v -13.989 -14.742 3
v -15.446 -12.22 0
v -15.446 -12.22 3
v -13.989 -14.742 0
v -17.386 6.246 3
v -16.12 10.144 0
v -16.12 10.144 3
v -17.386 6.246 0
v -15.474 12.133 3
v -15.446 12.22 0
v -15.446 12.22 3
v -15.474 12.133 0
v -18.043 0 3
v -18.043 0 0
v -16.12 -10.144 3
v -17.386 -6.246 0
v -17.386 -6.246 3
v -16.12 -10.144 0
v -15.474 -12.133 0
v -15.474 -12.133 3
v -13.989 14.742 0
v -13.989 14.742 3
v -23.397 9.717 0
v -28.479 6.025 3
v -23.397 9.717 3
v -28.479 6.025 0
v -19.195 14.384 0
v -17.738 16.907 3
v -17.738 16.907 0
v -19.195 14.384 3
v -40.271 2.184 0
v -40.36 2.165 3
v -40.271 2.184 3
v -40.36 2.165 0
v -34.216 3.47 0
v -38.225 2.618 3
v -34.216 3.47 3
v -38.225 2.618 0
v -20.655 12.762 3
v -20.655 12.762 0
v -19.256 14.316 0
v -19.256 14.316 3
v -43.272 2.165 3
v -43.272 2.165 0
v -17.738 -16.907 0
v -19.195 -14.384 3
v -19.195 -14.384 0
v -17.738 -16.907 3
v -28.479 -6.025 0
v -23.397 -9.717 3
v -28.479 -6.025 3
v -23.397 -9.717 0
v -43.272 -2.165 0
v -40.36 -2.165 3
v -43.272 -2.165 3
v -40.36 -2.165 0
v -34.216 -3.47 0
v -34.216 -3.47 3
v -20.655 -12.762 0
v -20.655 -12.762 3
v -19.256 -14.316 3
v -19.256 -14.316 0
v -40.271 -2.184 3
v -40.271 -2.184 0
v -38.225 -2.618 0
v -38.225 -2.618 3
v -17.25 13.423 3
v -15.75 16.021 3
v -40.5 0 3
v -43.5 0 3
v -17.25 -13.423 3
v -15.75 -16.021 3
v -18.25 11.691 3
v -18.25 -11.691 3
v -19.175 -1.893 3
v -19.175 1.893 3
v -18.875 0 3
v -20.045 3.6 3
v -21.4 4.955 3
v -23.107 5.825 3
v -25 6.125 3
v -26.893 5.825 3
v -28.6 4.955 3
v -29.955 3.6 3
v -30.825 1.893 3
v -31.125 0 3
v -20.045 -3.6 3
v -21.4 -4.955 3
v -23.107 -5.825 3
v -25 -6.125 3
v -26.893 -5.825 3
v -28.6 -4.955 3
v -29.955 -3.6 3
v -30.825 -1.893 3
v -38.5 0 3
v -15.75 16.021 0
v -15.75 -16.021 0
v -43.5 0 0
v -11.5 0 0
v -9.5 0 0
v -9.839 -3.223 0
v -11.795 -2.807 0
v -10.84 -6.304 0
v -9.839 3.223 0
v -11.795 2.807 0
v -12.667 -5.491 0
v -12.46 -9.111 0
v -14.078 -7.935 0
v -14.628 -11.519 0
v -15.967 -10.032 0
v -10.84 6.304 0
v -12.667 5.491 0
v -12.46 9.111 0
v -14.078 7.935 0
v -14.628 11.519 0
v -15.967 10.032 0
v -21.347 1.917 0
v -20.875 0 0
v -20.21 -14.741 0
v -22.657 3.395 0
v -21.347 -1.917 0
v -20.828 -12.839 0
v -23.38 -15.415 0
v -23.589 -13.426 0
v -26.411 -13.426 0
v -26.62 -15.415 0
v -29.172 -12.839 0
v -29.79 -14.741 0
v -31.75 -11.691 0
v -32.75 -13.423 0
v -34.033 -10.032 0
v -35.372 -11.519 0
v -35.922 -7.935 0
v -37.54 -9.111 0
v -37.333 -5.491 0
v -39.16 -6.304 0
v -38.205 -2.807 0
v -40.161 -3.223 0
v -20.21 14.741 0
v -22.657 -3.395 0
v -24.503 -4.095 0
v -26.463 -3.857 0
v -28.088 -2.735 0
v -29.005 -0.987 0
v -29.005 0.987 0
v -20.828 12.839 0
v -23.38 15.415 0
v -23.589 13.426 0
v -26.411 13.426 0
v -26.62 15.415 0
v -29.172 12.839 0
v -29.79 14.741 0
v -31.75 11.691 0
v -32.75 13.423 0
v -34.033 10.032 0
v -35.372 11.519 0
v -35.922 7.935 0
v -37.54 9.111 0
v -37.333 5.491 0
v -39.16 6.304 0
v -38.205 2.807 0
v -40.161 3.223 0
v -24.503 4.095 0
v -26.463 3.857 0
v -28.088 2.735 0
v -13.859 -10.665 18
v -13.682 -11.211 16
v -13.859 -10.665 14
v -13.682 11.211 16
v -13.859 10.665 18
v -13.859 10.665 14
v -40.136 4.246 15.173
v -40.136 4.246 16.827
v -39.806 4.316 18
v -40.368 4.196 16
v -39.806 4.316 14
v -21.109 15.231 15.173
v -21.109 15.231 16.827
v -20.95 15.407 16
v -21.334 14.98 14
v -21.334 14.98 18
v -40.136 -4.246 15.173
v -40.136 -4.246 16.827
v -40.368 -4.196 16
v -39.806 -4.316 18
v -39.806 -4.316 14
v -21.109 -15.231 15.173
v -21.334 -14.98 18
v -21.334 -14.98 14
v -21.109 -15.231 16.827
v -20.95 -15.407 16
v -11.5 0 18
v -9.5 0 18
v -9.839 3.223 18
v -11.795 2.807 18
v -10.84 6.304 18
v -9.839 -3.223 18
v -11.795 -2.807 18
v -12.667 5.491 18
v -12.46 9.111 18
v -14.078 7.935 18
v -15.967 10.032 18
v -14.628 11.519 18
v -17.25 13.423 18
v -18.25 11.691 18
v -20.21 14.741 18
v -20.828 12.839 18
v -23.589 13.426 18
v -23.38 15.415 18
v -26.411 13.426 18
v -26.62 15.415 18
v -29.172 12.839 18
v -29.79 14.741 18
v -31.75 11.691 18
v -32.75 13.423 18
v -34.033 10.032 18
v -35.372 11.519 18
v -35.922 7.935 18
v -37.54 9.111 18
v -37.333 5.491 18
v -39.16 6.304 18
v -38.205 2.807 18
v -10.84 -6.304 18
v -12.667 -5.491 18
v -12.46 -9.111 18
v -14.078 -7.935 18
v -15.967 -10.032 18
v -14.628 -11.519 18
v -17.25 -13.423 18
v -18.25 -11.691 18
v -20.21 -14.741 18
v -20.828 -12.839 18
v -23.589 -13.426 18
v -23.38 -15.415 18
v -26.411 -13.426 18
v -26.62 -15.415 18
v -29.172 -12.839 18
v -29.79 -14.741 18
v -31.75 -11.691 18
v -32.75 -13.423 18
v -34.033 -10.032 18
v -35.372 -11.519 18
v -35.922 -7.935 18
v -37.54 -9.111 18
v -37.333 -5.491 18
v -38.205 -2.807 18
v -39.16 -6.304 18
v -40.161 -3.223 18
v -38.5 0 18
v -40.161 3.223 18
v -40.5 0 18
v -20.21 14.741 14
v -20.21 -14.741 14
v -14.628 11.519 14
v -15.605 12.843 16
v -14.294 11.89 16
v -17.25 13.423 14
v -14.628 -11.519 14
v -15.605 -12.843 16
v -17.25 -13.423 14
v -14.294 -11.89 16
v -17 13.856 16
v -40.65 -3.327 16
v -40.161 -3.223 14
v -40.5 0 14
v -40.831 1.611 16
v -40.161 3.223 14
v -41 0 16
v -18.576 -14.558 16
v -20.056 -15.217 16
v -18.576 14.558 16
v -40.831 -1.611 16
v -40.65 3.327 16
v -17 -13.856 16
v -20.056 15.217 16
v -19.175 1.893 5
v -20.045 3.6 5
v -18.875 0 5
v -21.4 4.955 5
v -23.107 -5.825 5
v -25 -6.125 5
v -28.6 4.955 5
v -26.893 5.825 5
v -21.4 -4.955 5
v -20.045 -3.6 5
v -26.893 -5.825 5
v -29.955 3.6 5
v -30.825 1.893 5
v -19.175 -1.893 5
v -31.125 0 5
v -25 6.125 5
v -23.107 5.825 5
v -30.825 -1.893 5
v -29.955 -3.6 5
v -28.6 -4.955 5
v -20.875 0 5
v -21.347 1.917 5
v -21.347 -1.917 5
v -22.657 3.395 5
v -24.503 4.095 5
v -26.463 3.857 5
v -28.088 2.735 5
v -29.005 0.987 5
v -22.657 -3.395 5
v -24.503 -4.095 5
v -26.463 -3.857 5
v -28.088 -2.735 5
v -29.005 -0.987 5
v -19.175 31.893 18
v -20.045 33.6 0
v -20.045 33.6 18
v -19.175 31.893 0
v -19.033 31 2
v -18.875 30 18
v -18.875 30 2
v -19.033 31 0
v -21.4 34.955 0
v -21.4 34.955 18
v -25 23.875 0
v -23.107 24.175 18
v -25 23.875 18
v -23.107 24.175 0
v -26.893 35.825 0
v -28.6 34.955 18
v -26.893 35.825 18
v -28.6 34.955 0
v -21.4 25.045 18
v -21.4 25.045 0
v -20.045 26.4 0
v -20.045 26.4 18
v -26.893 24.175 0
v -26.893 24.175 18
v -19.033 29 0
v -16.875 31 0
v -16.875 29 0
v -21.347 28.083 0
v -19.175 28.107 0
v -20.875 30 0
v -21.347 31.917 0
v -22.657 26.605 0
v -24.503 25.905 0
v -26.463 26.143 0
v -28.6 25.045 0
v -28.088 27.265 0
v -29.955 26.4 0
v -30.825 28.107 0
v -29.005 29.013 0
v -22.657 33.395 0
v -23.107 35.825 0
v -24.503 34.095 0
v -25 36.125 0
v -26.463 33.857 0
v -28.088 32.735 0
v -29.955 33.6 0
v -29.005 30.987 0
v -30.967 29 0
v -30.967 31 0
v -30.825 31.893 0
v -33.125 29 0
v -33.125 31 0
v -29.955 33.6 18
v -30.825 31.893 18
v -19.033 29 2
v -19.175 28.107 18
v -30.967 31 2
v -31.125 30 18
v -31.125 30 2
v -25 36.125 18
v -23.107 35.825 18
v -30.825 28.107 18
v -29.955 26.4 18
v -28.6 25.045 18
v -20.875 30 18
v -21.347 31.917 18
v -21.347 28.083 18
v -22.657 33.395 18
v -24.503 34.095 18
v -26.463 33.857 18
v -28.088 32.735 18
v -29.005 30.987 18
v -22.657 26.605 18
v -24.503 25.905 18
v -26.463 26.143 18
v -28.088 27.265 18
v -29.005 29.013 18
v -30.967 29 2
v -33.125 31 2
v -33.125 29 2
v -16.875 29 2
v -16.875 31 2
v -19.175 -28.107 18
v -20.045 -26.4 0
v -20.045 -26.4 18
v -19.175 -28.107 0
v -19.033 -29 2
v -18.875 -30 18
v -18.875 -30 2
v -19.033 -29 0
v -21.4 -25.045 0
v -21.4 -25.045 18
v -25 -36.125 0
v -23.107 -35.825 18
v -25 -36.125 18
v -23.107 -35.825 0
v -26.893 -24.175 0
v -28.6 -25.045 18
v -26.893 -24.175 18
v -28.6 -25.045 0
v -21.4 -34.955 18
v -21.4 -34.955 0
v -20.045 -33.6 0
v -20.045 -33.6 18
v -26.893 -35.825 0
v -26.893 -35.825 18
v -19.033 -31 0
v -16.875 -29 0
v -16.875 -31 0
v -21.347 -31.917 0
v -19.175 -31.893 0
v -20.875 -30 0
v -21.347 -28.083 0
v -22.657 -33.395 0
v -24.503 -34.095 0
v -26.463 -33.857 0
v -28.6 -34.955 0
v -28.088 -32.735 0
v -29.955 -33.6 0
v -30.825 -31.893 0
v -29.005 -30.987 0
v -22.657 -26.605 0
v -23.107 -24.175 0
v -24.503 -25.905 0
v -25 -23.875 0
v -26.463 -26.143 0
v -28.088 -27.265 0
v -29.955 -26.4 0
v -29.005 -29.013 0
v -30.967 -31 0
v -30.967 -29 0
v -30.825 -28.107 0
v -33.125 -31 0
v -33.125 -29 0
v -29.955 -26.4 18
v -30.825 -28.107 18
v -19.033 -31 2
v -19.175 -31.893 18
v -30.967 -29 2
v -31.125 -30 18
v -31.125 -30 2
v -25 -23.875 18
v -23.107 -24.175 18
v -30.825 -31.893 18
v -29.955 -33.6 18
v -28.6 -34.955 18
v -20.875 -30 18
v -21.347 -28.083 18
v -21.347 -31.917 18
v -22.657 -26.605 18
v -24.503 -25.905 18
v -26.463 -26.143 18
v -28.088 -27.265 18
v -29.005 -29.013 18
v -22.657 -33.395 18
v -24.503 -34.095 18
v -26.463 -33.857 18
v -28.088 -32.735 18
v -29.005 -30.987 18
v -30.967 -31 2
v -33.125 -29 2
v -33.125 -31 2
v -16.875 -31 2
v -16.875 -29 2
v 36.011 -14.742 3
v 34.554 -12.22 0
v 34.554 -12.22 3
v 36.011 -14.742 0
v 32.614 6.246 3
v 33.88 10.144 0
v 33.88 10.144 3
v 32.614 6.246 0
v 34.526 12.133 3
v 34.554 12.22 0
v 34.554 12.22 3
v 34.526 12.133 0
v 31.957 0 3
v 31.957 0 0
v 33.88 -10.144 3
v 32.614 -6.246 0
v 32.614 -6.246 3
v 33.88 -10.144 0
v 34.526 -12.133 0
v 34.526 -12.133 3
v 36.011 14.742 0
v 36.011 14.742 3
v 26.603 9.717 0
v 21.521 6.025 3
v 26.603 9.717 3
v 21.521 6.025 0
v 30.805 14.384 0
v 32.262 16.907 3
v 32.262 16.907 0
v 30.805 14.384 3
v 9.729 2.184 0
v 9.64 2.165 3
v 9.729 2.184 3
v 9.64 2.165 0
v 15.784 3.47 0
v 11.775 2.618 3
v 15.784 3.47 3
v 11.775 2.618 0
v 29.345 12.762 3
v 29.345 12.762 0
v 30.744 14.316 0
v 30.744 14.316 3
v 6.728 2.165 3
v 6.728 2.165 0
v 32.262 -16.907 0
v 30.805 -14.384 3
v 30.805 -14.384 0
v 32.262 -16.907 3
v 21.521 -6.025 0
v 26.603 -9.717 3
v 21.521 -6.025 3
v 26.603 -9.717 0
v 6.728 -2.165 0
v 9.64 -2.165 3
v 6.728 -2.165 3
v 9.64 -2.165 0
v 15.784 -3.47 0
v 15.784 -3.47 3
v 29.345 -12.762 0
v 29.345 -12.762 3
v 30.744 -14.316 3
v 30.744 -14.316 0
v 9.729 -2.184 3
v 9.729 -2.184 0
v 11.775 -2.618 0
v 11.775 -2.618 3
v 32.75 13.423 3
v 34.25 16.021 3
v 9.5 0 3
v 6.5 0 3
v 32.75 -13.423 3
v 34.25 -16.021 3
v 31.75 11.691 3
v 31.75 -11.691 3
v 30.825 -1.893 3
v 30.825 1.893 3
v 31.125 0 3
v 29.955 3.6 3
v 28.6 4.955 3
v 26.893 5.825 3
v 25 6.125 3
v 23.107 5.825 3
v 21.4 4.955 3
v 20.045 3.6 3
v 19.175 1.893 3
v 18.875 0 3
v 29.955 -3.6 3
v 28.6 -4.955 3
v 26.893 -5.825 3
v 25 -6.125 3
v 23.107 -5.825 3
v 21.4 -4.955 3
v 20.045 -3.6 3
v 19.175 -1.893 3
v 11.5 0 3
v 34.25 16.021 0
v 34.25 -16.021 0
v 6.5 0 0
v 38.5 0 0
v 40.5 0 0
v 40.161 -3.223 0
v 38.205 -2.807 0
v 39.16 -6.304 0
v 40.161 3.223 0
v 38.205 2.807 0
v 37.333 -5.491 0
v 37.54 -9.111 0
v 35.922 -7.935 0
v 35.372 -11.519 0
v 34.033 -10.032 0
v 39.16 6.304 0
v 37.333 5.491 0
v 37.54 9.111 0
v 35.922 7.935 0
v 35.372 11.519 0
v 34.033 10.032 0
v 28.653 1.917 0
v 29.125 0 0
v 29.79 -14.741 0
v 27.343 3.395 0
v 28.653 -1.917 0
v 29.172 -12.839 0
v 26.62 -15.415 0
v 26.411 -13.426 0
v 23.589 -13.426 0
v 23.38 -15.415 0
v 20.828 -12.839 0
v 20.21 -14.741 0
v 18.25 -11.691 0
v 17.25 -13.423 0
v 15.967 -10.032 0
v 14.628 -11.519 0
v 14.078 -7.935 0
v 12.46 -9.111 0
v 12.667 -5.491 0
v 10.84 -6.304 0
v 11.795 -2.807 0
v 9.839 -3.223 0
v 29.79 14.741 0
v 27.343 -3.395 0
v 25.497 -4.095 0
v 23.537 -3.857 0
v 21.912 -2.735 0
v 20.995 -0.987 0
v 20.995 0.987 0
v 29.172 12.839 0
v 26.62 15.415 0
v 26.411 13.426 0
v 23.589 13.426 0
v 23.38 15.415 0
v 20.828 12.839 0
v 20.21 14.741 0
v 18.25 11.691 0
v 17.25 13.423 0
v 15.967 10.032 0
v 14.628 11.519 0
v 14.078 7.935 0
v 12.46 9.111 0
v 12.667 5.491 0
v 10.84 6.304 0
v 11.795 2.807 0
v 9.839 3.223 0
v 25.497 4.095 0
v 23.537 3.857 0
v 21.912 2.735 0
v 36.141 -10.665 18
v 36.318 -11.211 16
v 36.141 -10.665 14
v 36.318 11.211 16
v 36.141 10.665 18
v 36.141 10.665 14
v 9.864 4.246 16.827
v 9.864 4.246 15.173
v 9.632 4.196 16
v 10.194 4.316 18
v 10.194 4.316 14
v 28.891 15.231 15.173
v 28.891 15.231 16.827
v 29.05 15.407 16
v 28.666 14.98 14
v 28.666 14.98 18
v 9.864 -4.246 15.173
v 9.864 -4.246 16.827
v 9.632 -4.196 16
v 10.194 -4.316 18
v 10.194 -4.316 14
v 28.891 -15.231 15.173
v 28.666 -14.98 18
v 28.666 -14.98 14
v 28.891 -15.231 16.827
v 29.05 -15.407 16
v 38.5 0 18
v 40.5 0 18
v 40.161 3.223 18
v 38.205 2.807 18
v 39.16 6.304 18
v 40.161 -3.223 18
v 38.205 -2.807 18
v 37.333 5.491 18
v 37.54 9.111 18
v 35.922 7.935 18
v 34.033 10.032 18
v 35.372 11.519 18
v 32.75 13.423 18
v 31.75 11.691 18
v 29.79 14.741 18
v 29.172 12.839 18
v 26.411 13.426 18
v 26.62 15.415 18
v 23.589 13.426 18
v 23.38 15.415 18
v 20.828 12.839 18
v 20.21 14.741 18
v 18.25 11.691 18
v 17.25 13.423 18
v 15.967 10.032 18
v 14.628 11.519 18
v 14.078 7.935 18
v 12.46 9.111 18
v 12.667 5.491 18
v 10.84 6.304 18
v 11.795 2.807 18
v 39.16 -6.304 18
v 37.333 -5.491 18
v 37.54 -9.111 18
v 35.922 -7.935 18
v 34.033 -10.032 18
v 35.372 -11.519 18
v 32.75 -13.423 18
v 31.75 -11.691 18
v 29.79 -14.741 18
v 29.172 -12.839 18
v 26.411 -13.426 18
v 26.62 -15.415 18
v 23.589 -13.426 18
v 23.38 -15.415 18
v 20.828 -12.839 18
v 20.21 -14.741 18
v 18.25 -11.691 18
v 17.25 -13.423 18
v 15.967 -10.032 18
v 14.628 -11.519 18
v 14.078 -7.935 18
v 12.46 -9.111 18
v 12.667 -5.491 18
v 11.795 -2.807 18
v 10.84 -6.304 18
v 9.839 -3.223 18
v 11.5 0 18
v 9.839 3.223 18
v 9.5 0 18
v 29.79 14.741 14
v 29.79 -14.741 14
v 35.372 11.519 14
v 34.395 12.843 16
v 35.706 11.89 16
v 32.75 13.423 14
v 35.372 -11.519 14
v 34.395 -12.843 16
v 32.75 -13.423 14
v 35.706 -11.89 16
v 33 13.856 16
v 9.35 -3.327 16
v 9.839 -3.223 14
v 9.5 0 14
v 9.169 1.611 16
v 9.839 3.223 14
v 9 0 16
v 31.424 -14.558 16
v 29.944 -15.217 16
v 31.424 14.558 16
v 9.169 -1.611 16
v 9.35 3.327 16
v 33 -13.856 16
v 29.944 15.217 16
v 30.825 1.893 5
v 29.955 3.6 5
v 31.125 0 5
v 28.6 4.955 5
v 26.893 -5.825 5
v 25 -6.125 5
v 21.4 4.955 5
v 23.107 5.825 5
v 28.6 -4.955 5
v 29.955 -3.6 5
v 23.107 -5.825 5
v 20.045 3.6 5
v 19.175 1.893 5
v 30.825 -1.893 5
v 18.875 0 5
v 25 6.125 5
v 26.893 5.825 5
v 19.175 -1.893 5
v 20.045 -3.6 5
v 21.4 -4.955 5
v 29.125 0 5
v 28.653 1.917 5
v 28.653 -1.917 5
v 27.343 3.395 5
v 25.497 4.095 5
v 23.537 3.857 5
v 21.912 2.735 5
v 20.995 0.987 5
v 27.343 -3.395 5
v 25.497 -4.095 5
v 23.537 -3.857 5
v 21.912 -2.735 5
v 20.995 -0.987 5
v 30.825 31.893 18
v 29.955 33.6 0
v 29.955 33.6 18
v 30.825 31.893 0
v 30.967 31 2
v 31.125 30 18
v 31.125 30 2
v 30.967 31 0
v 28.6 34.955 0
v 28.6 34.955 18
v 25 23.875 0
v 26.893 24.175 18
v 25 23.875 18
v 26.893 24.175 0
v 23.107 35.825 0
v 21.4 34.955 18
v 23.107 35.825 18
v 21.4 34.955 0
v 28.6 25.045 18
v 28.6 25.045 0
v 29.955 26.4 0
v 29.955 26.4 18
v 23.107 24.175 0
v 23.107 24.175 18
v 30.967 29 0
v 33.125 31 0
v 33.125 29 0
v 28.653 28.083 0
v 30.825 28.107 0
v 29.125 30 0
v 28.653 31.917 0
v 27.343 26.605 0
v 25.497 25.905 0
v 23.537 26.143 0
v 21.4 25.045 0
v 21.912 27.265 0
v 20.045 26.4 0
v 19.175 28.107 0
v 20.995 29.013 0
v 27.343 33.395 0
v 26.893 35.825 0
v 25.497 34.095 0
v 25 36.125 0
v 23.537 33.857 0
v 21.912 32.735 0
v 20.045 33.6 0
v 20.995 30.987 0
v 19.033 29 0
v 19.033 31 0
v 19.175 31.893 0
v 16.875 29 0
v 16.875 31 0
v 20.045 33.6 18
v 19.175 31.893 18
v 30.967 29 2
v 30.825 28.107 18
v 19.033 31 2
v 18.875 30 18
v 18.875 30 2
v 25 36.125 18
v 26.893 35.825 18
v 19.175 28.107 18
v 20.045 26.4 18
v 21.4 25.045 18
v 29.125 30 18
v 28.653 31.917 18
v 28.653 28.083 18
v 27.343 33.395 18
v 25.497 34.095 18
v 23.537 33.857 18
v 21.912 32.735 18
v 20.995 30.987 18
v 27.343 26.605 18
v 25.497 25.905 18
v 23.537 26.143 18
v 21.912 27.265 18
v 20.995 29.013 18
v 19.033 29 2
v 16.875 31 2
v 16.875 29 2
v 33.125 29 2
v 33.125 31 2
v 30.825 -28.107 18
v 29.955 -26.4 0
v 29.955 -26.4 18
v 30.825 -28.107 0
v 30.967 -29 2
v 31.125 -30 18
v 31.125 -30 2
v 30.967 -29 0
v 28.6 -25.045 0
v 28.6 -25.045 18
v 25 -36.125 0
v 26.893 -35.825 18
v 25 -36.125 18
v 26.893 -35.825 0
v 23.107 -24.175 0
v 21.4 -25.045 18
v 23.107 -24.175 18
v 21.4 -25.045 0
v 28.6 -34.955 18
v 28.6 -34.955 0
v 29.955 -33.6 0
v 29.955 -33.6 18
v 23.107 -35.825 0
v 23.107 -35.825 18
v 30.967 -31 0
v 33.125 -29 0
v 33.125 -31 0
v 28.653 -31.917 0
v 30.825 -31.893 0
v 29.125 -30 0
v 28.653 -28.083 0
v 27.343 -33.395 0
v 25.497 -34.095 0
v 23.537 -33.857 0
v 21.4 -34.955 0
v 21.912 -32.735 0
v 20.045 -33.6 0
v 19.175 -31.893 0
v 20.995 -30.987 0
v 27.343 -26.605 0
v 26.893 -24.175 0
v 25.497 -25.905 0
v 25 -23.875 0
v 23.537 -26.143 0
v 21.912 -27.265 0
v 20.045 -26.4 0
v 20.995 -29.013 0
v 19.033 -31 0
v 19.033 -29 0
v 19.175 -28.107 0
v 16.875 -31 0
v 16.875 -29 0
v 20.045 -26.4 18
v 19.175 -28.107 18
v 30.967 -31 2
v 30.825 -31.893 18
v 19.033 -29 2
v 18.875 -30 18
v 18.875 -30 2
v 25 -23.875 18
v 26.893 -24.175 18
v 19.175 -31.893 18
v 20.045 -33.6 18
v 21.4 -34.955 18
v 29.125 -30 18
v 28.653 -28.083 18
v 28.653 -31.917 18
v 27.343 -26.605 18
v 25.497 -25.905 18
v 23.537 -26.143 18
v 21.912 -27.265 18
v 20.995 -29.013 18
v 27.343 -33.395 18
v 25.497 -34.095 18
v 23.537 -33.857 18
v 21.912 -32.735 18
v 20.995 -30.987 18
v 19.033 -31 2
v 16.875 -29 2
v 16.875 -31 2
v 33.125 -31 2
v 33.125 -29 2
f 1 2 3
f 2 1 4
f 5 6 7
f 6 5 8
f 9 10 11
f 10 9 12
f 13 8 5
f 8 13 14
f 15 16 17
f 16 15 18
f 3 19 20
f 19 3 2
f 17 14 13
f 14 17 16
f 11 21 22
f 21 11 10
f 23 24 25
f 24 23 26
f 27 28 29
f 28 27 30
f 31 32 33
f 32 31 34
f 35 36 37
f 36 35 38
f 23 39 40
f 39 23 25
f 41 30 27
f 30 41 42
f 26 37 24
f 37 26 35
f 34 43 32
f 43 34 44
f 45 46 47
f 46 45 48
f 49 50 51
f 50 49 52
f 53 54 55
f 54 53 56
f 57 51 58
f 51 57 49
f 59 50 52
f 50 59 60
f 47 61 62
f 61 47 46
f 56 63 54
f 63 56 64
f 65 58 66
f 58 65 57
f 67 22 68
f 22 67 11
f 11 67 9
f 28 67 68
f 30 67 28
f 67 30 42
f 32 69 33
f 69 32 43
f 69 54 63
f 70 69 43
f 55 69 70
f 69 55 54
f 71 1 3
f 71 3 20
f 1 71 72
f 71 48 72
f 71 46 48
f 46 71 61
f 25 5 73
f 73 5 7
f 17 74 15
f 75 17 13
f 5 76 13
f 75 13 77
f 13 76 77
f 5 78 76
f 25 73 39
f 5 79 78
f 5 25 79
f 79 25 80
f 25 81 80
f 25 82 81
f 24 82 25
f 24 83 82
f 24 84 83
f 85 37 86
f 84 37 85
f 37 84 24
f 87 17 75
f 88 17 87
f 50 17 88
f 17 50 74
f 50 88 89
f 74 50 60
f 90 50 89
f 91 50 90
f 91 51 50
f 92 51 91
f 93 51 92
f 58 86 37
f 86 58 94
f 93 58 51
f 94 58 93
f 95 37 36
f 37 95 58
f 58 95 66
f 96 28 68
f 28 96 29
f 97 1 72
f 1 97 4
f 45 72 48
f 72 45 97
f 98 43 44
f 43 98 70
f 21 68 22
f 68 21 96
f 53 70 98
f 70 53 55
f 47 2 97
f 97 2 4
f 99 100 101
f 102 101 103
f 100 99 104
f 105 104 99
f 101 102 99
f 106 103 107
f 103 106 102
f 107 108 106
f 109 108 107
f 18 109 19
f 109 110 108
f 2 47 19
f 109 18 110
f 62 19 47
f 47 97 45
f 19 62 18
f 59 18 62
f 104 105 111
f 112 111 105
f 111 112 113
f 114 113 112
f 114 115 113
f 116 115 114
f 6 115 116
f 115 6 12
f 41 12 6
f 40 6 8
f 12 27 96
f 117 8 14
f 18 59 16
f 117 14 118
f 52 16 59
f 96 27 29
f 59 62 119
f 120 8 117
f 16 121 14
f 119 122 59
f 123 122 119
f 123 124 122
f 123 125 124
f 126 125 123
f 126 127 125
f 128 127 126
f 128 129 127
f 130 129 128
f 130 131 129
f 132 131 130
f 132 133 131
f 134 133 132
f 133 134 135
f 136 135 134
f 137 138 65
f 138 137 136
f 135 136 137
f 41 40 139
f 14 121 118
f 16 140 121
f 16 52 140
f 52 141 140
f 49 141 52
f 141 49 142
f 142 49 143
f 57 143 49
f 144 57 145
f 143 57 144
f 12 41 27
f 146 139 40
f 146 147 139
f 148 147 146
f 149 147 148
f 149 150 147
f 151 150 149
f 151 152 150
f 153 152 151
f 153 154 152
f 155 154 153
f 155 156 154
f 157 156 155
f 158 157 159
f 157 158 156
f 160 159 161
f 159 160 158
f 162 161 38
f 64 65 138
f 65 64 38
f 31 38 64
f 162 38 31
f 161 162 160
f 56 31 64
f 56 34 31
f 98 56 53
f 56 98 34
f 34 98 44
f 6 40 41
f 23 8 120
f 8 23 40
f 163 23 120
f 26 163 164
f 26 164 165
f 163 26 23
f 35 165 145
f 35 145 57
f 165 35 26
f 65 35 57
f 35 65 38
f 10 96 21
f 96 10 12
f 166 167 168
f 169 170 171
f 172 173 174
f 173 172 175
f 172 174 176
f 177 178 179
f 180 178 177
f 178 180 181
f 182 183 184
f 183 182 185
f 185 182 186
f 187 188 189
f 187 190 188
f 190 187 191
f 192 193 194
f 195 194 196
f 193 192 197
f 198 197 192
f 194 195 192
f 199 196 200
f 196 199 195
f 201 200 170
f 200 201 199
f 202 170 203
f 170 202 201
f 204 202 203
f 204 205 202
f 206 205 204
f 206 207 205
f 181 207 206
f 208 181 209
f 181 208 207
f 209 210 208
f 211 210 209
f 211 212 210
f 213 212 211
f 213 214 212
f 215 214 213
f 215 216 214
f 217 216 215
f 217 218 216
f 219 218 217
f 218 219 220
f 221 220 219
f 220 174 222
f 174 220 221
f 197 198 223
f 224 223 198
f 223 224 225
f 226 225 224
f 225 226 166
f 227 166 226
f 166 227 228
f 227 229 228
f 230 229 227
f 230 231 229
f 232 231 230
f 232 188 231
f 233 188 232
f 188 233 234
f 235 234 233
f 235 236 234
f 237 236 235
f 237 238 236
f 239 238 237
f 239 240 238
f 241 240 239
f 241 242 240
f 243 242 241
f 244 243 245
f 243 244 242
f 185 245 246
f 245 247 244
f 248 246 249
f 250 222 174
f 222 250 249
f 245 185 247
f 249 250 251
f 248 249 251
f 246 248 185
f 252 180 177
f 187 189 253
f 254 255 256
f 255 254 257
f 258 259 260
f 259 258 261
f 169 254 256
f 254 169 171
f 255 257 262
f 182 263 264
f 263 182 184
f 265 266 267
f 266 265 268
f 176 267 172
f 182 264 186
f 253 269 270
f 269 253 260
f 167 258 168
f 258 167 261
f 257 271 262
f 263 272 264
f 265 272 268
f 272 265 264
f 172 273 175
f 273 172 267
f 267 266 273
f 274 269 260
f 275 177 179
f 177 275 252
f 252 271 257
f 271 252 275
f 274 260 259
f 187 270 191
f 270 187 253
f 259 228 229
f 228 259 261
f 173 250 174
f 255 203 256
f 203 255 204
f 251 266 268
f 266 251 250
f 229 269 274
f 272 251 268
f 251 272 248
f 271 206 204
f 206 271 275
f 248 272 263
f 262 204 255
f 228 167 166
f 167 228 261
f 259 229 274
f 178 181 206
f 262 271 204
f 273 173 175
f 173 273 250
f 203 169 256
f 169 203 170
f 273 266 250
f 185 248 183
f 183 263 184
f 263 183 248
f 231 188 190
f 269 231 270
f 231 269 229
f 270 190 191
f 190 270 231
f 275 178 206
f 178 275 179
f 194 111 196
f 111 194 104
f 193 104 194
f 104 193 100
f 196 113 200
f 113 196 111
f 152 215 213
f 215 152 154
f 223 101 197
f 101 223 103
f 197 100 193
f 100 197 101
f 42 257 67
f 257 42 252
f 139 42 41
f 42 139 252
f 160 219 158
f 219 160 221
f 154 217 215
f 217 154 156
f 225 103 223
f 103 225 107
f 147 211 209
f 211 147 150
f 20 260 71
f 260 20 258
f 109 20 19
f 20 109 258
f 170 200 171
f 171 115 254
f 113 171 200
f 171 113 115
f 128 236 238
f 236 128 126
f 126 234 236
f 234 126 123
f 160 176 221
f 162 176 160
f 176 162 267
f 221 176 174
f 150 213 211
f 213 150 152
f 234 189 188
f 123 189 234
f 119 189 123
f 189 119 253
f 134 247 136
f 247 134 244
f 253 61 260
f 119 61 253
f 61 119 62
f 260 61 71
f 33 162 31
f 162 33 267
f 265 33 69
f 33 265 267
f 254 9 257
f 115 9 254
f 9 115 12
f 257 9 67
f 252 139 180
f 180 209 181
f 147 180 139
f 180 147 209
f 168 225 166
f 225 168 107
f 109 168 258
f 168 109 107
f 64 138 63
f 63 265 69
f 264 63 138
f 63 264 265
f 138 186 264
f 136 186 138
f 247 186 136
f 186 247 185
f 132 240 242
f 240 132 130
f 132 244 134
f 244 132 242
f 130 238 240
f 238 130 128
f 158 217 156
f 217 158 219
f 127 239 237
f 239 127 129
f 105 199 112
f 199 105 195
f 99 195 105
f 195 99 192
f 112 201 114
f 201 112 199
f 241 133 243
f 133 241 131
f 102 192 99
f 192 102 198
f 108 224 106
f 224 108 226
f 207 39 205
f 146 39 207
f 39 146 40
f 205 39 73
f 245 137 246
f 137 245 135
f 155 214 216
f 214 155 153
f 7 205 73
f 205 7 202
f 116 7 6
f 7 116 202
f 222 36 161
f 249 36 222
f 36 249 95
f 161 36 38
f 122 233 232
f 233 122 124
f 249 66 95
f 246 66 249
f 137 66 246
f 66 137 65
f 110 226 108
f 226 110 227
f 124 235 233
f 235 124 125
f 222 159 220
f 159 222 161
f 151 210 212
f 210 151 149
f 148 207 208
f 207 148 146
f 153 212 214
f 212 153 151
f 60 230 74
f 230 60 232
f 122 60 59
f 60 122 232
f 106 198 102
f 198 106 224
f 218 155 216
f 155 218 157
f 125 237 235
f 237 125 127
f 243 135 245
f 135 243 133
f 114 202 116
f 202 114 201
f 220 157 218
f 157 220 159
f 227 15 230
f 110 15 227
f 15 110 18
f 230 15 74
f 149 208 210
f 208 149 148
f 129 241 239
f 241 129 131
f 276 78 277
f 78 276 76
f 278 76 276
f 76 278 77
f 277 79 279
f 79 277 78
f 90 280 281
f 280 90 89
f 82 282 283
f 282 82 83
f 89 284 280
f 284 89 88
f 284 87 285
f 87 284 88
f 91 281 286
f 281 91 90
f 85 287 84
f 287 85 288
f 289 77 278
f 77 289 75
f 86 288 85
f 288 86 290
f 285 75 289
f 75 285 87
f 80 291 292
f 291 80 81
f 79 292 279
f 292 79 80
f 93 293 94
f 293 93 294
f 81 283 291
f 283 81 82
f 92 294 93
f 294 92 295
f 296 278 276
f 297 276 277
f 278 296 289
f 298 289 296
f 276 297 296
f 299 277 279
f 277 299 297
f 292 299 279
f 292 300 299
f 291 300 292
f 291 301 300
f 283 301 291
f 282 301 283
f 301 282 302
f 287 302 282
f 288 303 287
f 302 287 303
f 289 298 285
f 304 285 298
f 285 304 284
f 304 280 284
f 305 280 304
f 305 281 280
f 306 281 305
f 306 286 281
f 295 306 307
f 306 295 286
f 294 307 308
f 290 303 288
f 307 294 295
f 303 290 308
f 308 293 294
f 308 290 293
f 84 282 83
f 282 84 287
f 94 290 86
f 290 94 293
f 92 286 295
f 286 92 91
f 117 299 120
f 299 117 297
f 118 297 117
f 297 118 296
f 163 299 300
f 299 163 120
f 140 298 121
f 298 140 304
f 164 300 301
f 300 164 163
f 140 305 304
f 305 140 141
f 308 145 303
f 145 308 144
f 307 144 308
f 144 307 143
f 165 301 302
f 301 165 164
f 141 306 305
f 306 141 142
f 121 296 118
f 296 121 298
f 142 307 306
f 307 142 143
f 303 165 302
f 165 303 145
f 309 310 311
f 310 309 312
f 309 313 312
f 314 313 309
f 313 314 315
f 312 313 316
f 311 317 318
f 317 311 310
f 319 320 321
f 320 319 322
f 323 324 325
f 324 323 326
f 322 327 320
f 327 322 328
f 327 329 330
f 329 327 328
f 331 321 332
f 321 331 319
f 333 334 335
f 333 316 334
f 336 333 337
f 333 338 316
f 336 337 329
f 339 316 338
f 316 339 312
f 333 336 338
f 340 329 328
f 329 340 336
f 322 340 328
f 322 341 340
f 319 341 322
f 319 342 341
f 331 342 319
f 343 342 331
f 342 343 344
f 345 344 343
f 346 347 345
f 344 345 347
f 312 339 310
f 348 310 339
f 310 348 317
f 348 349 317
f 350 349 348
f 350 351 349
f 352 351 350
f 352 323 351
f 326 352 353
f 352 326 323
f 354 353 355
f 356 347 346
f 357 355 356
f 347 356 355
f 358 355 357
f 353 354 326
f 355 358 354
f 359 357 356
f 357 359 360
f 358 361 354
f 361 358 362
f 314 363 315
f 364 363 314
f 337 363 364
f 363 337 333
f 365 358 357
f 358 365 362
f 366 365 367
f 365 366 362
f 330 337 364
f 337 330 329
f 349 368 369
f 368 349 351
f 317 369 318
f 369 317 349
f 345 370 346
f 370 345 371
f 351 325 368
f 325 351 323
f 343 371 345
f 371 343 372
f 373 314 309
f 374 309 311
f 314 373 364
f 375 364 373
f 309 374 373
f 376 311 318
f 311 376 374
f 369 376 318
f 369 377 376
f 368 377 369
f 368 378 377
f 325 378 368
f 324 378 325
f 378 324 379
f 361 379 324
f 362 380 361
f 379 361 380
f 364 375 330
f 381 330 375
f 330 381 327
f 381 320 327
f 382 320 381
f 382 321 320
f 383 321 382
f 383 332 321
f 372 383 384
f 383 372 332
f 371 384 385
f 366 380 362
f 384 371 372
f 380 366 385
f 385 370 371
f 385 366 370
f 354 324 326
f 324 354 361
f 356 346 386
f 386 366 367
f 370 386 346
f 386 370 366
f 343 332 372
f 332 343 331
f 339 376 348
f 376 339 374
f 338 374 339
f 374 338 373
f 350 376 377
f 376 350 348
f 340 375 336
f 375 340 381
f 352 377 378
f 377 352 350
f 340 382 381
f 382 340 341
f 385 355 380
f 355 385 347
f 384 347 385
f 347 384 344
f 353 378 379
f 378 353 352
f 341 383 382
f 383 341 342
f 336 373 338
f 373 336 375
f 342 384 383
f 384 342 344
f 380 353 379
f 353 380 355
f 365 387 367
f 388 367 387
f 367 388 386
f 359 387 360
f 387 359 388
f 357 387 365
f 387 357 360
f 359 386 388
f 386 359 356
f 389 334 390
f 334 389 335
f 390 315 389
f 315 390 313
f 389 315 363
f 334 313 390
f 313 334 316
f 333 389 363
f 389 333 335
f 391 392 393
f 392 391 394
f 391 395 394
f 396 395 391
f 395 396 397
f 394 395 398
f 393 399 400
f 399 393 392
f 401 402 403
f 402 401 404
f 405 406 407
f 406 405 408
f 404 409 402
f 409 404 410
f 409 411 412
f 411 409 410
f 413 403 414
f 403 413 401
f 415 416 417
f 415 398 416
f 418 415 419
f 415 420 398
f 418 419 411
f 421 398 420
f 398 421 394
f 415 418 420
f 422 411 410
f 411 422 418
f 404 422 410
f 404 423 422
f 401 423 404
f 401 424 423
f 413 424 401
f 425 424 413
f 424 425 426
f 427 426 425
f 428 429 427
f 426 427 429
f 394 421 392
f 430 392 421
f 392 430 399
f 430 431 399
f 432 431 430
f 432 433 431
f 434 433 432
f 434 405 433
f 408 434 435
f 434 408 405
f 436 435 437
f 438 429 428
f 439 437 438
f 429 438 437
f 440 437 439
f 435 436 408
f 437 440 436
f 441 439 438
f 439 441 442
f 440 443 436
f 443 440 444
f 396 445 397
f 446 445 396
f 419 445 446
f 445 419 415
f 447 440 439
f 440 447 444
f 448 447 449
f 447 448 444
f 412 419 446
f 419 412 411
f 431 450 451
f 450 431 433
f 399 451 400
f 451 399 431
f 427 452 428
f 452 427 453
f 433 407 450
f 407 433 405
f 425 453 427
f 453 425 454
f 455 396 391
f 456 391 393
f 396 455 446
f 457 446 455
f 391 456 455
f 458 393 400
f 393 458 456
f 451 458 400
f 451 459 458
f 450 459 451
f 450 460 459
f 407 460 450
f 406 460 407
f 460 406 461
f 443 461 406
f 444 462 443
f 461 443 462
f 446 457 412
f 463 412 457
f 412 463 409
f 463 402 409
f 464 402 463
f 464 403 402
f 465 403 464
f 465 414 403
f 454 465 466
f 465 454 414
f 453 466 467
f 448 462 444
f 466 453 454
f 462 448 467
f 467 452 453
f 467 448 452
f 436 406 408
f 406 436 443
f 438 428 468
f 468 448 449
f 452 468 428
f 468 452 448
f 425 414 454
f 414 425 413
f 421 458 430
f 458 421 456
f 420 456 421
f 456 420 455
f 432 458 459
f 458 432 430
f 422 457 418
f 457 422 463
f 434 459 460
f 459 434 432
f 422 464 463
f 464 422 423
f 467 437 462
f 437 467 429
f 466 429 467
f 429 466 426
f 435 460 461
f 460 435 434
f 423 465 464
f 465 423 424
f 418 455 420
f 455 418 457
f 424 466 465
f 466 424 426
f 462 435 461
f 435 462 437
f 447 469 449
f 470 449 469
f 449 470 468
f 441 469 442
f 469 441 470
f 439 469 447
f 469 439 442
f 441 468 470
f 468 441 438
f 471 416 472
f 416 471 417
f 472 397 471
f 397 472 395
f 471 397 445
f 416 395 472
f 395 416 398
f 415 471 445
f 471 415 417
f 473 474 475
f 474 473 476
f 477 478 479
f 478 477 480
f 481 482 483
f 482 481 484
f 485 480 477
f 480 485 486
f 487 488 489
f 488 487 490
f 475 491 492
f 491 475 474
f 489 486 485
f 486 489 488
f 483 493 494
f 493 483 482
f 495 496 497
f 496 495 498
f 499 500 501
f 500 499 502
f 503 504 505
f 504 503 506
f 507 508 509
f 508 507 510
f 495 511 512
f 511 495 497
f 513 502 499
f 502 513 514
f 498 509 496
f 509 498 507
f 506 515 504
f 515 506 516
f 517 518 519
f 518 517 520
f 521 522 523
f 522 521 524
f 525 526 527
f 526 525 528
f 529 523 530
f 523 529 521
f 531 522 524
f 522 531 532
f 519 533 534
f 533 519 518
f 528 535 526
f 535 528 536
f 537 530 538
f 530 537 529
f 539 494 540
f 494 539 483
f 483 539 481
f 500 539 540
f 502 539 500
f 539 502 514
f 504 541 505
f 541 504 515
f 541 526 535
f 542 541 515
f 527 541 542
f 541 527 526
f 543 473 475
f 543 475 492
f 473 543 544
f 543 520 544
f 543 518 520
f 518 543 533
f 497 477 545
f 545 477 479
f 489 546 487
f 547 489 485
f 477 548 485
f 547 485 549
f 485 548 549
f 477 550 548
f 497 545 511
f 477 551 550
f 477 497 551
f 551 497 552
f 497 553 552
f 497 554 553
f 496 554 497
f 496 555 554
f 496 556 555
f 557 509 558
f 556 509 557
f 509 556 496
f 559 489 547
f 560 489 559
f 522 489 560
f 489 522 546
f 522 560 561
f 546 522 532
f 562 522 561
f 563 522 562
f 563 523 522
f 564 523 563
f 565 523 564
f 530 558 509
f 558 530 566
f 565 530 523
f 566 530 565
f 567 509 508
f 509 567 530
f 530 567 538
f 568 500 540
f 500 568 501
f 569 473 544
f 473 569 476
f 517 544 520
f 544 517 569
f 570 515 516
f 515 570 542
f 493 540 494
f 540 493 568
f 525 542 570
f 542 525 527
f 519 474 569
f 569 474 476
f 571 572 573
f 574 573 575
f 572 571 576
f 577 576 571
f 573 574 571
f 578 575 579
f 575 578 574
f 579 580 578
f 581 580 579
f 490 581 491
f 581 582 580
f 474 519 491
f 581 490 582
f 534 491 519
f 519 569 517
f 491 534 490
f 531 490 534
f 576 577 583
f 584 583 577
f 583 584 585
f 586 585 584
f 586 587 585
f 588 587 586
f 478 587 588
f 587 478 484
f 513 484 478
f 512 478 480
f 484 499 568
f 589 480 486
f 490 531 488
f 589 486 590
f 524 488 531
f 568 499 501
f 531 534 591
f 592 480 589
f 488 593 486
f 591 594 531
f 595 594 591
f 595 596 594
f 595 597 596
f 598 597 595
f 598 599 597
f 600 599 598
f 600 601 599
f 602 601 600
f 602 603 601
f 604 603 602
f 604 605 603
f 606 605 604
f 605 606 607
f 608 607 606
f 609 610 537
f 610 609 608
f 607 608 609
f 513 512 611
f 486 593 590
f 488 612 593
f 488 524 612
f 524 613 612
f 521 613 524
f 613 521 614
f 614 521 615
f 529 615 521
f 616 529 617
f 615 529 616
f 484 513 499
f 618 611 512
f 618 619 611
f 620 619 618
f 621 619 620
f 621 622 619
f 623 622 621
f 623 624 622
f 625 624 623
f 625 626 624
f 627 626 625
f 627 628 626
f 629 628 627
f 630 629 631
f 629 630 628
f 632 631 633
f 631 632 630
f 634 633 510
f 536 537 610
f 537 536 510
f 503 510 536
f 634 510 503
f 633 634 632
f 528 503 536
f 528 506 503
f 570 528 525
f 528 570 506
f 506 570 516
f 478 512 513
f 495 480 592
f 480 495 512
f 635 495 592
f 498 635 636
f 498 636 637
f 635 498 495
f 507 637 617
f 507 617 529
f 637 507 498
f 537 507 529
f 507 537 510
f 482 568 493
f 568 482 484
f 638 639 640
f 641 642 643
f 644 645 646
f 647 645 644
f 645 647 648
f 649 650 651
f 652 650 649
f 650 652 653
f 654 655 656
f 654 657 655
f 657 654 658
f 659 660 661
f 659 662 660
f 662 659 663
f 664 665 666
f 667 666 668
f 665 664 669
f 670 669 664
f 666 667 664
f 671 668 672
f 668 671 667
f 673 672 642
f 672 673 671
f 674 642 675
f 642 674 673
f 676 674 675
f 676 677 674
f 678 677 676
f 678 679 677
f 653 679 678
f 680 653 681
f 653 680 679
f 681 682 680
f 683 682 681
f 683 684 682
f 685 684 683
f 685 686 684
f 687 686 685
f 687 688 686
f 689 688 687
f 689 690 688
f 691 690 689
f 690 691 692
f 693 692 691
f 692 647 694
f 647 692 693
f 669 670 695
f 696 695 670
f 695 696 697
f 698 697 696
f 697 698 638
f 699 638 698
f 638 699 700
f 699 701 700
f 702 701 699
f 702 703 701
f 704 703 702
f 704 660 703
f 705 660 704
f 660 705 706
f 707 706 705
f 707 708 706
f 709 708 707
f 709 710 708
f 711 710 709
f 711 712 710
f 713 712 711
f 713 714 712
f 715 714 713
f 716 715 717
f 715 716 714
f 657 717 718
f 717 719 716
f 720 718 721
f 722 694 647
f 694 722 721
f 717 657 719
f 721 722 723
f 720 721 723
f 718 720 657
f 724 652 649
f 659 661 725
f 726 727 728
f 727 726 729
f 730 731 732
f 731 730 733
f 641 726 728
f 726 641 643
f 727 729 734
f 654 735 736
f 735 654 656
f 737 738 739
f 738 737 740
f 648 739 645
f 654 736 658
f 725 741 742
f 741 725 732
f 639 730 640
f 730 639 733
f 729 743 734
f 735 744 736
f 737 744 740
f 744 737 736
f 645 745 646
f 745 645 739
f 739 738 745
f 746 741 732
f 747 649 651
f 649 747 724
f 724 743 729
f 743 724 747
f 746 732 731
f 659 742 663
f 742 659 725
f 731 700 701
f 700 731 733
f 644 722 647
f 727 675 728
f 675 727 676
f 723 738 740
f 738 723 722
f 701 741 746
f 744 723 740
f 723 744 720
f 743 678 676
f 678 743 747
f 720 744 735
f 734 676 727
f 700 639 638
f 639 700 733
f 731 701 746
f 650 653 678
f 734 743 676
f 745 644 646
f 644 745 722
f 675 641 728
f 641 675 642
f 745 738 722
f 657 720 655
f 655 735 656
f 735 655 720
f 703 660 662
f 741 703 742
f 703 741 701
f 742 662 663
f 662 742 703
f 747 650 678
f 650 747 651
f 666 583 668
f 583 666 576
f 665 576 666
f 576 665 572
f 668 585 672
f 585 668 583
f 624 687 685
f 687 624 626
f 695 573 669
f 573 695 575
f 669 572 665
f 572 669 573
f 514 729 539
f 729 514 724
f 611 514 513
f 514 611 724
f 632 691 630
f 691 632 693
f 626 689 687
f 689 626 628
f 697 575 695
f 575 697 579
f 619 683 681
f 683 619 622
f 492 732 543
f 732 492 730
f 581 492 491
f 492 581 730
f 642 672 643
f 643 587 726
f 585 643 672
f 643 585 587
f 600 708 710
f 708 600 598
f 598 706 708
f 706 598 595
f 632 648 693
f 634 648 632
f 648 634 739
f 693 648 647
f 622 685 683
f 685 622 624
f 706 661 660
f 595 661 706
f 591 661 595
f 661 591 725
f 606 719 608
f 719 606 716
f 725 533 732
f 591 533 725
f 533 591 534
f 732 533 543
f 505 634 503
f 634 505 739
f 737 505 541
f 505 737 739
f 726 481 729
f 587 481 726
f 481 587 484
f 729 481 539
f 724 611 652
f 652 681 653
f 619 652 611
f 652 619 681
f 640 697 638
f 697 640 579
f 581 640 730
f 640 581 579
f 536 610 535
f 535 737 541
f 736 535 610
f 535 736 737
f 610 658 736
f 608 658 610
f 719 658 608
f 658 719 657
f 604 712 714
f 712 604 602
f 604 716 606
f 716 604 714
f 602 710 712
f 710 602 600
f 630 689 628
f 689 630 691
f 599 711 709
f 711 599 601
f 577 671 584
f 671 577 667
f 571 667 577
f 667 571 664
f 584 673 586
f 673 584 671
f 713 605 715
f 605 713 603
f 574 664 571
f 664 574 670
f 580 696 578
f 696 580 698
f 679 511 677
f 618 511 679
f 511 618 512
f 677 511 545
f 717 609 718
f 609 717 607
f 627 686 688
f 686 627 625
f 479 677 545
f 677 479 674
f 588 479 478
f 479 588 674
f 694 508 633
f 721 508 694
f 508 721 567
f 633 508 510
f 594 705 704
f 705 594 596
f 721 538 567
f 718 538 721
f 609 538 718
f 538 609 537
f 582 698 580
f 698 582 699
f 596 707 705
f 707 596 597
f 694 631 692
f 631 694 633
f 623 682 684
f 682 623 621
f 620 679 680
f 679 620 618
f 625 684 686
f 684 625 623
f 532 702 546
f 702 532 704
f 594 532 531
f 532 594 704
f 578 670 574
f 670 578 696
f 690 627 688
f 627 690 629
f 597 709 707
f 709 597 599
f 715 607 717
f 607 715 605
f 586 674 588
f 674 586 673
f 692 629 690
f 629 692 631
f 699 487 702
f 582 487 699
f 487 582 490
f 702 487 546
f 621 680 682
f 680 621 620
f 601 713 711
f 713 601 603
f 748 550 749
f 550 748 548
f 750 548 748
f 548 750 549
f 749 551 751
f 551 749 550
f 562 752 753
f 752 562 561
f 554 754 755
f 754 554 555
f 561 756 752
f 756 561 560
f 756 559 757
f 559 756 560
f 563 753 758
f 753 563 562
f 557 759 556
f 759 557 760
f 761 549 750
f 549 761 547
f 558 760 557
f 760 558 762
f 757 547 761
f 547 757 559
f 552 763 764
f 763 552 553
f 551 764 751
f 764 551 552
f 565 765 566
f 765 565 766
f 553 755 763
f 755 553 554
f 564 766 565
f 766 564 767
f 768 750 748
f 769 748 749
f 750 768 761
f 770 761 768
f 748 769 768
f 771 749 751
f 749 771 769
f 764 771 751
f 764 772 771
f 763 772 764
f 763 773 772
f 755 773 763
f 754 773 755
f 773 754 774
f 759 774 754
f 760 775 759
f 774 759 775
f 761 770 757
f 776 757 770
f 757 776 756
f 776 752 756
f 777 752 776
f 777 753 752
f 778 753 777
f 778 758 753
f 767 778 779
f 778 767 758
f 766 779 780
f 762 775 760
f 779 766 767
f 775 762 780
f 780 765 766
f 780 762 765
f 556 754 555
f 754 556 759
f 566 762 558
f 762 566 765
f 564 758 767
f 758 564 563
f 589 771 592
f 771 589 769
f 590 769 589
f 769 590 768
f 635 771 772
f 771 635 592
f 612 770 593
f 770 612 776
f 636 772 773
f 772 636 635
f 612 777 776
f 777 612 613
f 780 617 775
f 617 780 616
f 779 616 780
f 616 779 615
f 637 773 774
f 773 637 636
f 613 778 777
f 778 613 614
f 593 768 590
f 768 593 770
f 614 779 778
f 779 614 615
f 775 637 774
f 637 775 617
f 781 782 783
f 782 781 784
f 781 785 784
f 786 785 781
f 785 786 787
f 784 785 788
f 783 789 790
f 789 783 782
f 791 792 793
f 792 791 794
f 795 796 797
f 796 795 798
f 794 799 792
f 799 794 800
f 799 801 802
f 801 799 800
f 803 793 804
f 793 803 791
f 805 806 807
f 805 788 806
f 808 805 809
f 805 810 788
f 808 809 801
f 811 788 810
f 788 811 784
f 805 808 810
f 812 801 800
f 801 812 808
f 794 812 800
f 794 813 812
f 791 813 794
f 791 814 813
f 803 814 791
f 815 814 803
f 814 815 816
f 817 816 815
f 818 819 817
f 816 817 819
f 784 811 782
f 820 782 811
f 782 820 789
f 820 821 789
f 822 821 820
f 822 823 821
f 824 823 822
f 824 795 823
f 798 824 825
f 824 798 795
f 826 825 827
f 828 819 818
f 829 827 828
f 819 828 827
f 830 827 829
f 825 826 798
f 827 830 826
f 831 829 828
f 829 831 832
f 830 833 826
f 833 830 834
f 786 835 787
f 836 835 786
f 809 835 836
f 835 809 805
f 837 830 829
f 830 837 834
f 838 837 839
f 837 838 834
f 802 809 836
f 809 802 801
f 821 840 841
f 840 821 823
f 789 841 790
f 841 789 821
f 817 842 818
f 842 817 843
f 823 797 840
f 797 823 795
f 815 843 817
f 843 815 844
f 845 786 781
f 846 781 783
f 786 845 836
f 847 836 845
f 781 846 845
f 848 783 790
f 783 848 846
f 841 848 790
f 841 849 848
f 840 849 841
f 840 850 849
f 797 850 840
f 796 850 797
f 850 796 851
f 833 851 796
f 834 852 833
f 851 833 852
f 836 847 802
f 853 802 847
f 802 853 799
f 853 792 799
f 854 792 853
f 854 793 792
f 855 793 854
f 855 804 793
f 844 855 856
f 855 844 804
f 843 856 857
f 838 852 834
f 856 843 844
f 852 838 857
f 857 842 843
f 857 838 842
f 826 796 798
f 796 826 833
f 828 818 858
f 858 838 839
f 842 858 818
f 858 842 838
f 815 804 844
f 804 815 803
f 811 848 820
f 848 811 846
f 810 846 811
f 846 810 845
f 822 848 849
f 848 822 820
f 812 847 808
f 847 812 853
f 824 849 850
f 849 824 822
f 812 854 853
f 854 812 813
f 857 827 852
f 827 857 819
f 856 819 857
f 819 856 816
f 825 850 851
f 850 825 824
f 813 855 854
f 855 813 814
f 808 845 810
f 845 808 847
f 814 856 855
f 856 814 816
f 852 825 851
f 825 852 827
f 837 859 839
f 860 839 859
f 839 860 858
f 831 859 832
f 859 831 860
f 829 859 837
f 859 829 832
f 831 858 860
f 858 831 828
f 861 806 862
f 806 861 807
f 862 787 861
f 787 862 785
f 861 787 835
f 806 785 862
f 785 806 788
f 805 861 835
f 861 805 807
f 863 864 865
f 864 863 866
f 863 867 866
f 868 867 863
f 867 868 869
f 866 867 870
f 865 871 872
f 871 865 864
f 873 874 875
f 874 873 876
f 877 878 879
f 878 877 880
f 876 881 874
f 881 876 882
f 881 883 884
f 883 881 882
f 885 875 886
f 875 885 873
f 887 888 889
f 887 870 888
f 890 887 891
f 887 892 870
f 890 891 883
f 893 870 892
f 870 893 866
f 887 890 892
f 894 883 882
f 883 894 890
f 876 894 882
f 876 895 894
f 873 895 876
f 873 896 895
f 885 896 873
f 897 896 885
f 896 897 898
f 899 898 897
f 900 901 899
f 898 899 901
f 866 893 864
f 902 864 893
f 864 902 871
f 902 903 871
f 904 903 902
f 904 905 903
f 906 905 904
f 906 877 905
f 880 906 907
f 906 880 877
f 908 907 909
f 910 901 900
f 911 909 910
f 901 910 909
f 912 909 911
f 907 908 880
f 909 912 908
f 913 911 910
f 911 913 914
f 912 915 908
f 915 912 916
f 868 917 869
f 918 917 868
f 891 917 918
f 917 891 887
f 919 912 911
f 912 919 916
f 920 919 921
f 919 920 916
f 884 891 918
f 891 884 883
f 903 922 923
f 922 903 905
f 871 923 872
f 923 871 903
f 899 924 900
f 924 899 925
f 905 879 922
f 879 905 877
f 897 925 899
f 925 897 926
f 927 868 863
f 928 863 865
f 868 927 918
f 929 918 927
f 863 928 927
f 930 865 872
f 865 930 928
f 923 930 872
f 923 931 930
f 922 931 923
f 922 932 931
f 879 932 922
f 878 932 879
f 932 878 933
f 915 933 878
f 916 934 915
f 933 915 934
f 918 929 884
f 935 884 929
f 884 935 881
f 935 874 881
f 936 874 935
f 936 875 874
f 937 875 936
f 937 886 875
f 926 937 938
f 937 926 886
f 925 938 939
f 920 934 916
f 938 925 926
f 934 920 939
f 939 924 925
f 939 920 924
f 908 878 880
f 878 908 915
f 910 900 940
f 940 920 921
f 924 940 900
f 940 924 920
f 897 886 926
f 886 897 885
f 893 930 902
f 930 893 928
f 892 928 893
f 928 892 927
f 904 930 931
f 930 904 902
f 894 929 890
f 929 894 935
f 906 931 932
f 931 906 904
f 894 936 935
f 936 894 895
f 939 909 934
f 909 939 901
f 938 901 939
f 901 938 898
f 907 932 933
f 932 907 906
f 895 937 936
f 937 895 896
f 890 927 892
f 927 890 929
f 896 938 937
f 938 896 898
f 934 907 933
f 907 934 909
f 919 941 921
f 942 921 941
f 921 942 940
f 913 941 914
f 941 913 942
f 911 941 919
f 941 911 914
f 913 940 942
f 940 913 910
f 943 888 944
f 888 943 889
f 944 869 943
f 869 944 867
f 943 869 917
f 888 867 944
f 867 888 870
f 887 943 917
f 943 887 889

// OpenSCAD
// file: SpoolHolder.scad
module tube(od, id, l)
{
    d = 1;
    difference()
    {
        cylinder(r=od/2, h=l);
        translate([0,0,-d]) cylinder(r=id/2, h=l+2*d);
    }
}

module threespokes(od, et, t)
{
    d = 1;
    difference()
    {
        cylinder(r=od/2, h=t);
        for (a=[0,120,240])
            translate([od*cos(a),od*sin(a),-d])
                cylinder(r=0.5*(sqrt(3)*od-et), h=t+d*2);
    }
}


module SpoolHolder(rd, rt, hd, ht, ad, at)
{
    d  = 1;
    t  = 2.0;  // thickness of hub tube
    bh = 0.5;  // height of retaining bump
    bt = 4;    // thickness of retaining bump
    b2 = bh*2;
    // Outer rim
    difference()
    {
        union()
        {
            threespokes(rd, 4, rt);
            difference()
            {
                union()
                {
                    cylinder(r=hd/2, h=ht);
                    translate([0,0,ht-bt]) 
                        intersection()
                        {
                            cylinder(r1=hd/2, r2=hd/2+b2, h=bt);
                            cylinder(r1=hd/2+b2, r2=hd/2, h=bt);
                            threespokes(rd, 8, bt);
                        }
                }
                translate([0,0,-d]) 
                    cylinder(r=(hd/2)-t, h=ht+d);
            }
            cylinder(r=(ad/2)+t, h=at);
        }
        translate([0,0,-d]) 
            cylinder(r=ad/2, h=at+2*d);    
    }
}

module SpoolSpacer(ad,l)
{
    t = 2;
    tube(ad+2*t, ad, l);
    // Add lumps to help hold tube when drilling out to clean hole
    translate([-((ad+t)/2)-1.5*t,-t/2,0]) cube([1.5*t,t,t]);
    translate([((ad+t)/2),-t/2,0]) cube([1.5*t,t,t]);
}

axledia = 8+0.25;

// Lay down 2-off 38mm hubs and spacers
for (x = [-25,25])
{
    translate([x,0,0])
    {
        SpoolHolder(38+6, 3, 38, 10, axledia, 5);
        translate([0,30,0]) SpoolSpacer(axledia, 15) ;
        translate([0,50,0]) SpoolSpacer(axledia, 15) ;
        translate([0,-30,0]) SpoolSpacer(axledia, 6) ;
    }
}

// threespokes(20, 3, 5);
// main file
use <SpoolHolder.scad>

axledia = 8+0.25;

// Lay down 2-off 31mm hubs and spacers
for (x = [-25,25])
{
    translate([x,0,0])
    {
        SpoolHolder(31+6, 3, 31, 18, axledia, 5);
        translate([0,30,0]) SpoolSpacer(axledia, 18);
        translate([0,-30,0]) SpoolSpacer(axledia,18);
    }
}
